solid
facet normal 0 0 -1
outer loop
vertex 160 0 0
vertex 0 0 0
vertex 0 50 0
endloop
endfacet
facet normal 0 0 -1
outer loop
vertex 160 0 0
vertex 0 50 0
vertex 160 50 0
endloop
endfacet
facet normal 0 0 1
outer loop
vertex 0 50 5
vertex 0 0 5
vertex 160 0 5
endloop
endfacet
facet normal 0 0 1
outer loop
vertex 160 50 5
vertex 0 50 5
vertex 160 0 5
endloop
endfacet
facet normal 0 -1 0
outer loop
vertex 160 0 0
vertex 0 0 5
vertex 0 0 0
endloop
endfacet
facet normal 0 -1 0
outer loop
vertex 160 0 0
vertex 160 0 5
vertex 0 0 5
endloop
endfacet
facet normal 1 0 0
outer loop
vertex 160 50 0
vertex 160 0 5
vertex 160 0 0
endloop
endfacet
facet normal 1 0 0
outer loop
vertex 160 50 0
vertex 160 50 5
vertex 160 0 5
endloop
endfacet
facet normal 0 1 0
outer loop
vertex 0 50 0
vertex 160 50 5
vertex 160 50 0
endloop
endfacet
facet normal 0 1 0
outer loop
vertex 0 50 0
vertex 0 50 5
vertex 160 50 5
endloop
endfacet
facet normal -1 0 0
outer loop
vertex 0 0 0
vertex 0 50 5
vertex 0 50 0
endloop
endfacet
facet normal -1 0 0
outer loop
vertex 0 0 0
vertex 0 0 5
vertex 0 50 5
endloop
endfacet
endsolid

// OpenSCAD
plate_l = 160; plate_w = 50; th = 5;
linear_extrude(height=th) square([plate_l, plate_w]);
